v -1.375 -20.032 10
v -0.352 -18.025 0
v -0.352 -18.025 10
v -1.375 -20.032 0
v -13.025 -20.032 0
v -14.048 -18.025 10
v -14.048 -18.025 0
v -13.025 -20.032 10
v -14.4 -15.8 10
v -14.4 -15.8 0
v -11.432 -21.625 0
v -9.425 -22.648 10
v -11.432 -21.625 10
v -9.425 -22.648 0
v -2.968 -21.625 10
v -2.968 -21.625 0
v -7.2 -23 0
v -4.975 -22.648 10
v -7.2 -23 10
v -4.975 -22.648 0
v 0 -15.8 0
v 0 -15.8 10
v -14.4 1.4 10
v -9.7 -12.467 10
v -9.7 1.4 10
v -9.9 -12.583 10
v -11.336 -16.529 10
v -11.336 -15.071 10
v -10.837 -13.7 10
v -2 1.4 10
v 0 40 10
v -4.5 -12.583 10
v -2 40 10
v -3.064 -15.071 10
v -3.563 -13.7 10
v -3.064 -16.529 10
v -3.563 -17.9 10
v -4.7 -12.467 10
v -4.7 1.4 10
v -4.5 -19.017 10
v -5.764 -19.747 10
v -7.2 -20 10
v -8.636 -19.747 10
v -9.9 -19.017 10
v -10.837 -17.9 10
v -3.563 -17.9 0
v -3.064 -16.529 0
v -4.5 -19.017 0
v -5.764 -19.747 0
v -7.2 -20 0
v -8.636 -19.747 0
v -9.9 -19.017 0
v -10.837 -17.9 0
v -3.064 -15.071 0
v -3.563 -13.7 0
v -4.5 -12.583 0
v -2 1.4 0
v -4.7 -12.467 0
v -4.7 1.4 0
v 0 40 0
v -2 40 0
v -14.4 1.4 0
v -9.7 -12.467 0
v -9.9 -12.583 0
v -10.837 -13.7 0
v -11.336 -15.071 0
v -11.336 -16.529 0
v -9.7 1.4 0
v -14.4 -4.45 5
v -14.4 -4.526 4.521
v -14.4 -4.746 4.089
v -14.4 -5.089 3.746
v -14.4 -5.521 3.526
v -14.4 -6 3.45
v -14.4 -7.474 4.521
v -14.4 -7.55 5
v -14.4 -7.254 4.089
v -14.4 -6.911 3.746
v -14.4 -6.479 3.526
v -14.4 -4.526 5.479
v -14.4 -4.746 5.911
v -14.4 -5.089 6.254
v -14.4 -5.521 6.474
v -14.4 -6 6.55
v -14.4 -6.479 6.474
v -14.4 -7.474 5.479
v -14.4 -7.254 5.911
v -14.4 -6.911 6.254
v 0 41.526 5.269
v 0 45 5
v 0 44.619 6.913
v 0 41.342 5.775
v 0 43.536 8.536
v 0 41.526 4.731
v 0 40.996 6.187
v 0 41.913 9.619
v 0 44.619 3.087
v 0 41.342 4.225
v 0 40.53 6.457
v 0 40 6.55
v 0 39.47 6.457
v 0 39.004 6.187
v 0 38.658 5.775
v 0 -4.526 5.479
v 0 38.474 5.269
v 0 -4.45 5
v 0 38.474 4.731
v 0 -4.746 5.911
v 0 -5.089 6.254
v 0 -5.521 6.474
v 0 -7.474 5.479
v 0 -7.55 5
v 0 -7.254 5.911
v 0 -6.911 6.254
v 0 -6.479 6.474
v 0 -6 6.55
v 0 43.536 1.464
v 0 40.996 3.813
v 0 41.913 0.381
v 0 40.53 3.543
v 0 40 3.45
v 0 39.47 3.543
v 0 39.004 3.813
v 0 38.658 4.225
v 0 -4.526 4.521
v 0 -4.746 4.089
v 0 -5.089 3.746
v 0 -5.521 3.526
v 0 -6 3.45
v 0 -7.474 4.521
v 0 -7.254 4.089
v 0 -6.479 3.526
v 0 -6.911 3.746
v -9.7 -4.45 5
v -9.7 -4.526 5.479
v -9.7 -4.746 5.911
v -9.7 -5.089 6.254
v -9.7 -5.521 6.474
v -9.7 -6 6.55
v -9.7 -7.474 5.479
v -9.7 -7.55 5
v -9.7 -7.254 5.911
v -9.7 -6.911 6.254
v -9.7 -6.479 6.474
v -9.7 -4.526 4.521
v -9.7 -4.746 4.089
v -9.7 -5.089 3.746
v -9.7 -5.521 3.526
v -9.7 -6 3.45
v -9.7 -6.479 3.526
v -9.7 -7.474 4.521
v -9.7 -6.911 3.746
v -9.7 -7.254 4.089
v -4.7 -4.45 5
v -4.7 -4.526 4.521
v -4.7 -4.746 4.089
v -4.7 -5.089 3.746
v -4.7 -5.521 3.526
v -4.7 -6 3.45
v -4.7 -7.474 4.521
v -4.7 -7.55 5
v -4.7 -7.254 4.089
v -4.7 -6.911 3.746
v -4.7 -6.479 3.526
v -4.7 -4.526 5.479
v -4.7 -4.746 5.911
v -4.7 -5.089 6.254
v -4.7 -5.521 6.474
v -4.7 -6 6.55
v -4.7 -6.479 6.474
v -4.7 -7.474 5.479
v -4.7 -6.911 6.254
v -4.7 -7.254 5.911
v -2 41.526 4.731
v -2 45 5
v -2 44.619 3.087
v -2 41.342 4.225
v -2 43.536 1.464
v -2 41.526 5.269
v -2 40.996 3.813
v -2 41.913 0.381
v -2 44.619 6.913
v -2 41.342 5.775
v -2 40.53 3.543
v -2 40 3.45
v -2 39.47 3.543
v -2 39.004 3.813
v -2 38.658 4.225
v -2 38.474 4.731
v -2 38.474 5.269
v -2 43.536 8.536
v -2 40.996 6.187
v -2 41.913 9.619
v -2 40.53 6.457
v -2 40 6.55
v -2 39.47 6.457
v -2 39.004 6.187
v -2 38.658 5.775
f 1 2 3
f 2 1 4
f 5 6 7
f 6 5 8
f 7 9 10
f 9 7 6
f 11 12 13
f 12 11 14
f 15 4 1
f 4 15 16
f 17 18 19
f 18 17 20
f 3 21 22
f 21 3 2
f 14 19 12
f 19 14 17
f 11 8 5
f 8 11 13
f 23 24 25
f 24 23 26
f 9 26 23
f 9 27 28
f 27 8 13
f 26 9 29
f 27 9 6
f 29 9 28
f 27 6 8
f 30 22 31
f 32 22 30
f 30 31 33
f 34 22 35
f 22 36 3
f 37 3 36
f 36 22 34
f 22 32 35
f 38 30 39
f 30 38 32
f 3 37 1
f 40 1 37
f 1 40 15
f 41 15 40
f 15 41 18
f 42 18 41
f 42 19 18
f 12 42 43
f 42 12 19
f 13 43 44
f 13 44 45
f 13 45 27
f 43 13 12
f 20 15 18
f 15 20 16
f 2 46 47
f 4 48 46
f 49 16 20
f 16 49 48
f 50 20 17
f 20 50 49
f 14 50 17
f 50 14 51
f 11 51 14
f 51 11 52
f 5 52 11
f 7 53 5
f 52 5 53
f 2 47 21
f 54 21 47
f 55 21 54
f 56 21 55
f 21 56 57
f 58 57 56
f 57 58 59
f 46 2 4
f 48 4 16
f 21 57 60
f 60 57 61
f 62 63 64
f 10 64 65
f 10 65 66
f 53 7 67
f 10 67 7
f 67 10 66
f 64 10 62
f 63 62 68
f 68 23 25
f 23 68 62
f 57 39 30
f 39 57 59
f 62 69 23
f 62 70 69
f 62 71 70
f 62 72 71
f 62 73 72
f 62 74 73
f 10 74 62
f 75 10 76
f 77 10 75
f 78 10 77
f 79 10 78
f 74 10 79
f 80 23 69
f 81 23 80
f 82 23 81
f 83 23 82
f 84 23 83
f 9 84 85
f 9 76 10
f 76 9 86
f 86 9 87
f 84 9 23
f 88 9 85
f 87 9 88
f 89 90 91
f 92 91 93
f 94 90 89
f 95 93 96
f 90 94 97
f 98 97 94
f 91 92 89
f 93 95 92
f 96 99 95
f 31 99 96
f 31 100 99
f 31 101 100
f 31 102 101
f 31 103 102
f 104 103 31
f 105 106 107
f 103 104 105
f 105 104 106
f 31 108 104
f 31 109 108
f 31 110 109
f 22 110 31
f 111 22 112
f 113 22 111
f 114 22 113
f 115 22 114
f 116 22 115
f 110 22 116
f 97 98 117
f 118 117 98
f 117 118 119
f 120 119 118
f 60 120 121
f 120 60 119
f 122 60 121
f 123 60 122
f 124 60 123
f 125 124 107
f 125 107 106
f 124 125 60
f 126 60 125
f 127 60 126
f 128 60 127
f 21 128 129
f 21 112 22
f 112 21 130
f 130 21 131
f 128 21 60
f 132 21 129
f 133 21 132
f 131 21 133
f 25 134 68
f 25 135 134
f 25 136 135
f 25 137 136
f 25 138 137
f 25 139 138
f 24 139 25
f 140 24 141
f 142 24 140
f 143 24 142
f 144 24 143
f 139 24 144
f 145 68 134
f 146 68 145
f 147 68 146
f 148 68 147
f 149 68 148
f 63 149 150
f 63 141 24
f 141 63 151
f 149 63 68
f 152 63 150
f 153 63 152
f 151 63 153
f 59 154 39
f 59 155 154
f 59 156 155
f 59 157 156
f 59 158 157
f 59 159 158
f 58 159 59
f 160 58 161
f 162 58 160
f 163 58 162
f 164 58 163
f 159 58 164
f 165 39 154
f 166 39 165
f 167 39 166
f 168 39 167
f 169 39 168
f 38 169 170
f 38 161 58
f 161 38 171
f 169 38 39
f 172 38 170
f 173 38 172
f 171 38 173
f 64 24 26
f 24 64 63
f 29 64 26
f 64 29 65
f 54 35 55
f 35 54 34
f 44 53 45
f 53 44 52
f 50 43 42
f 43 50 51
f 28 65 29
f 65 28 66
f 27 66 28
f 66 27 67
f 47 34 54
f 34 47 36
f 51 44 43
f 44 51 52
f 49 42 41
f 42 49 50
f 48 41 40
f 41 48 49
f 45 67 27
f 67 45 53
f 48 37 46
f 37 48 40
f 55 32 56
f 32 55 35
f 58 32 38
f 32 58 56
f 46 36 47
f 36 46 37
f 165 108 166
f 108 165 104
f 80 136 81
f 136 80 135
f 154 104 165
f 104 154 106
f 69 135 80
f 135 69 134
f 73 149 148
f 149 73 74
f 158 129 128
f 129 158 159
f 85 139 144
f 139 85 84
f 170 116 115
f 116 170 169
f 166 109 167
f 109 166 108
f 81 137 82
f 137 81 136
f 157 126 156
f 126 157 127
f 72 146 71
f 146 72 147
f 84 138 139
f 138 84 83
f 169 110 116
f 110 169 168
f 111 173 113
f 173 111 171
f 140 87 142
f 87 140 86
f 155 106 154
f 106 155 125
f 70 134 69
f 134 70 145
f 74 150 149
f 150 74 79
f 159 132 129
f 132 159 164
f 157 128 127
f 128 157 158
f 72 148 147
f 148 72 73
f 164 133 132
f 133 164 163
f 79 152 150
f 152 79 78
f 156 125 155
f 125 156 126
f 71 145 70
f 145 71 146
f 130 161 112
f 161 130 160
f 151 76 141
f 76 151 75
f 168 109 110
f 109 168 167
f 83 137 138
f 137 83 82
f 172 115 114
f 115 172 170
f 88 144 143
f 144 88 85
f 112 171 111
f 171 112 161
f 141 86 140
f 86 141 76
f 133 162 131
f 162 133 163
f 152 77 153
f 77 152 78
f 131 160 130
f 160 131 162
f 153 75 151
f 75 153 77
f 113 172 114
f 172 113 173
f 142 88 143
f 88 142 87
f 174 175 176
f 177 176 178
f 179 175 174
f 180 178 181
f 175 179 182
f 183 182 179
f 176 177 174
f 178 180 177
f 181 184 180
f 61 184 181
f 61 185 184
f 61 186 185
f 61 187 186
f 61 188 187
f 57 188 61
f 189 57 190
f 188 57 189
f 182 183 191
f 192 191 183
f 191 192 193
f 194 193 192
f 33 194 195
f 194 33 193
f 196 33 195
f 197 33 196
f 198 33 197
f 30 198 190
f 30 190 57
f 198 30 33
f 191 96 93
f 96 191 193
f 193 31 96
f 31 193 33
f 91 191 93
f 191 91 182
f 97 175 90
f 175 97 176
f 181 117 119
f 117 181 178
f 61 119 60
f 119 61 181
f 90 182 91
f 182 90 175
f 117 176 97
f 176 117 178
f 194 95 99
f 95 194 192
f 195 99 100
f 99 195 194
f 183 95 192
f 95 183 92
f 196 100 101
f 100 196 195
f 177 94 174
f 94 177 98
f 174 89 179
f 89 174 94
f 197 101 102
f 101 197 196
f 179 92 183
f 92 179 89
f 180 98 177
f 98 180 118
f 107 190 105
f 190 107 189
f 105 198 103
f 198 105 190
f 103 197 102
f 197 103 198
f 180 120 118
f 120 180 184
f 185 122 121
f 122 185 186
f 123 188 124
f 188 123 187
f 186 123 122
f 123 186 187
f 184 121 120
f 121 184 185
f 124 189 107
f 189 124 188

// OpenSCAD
/**
 * extruder bar mount
 * allows standard extruder to be mounted at an angle to the frame for a bit more z height
 */ 

m8_diameter = 8.4;
m3_diameter = 3.1;
arm_length = 40;

module barclamp(){
outer_diameter_y = (m8_diameter-0.0)/2+3;
outer_diameter_z = outer_diameter_y;
//outer_diameter_z = 5;

difference(){
	union(){
		
		translate([outer_diameter_y, outer_diameter_y, 0])cylinder(h =10, r = outer_diameter_y, $fn = 20);
		translate([outer_diameter_y, 0, 0])cube([outer_diameter_y+10,outer_diameter_y*2,10]);
		//translate([18, 2*outer_diameter_y, outer_diameter_z])rotate([90, 0, 0]) rotate([0, 0, 0])
		//nut(outer_diameter_z*2,outer_diameter_y*2,false);
	}


	translate([19, outer_diameter_y, 9]) #cube([19,5,20], center=true);
	translate([outer_diameter_y, outer_diameter_y, -1]) cylinder(h =20, r = m8_diameter/2, $fn = 18);
	translate([17, 17, 5]) rotate([90, 0, 0]) cylinder(h =80, r = m3_diameter/2, $fn = 20);
}
}

rotate(a=[0,0,90]){
translate([-23,0,0]) barclamp();
}
rotate(a=[0,270,0]){
difference()
{
union(){
cube([10,arm_length,2]);
//translate([5,1,0]) cylinder(2,5,5);
translate([5,arm_length,0])cylinder(2,5,5);
}
//translate([5,1,0]) cylinder(4,1.7,1.7);
translate([5,arm_length,0]) cylinder(4,m3_diameter/2,m3_diameter/2,$fn=18);
}
}
